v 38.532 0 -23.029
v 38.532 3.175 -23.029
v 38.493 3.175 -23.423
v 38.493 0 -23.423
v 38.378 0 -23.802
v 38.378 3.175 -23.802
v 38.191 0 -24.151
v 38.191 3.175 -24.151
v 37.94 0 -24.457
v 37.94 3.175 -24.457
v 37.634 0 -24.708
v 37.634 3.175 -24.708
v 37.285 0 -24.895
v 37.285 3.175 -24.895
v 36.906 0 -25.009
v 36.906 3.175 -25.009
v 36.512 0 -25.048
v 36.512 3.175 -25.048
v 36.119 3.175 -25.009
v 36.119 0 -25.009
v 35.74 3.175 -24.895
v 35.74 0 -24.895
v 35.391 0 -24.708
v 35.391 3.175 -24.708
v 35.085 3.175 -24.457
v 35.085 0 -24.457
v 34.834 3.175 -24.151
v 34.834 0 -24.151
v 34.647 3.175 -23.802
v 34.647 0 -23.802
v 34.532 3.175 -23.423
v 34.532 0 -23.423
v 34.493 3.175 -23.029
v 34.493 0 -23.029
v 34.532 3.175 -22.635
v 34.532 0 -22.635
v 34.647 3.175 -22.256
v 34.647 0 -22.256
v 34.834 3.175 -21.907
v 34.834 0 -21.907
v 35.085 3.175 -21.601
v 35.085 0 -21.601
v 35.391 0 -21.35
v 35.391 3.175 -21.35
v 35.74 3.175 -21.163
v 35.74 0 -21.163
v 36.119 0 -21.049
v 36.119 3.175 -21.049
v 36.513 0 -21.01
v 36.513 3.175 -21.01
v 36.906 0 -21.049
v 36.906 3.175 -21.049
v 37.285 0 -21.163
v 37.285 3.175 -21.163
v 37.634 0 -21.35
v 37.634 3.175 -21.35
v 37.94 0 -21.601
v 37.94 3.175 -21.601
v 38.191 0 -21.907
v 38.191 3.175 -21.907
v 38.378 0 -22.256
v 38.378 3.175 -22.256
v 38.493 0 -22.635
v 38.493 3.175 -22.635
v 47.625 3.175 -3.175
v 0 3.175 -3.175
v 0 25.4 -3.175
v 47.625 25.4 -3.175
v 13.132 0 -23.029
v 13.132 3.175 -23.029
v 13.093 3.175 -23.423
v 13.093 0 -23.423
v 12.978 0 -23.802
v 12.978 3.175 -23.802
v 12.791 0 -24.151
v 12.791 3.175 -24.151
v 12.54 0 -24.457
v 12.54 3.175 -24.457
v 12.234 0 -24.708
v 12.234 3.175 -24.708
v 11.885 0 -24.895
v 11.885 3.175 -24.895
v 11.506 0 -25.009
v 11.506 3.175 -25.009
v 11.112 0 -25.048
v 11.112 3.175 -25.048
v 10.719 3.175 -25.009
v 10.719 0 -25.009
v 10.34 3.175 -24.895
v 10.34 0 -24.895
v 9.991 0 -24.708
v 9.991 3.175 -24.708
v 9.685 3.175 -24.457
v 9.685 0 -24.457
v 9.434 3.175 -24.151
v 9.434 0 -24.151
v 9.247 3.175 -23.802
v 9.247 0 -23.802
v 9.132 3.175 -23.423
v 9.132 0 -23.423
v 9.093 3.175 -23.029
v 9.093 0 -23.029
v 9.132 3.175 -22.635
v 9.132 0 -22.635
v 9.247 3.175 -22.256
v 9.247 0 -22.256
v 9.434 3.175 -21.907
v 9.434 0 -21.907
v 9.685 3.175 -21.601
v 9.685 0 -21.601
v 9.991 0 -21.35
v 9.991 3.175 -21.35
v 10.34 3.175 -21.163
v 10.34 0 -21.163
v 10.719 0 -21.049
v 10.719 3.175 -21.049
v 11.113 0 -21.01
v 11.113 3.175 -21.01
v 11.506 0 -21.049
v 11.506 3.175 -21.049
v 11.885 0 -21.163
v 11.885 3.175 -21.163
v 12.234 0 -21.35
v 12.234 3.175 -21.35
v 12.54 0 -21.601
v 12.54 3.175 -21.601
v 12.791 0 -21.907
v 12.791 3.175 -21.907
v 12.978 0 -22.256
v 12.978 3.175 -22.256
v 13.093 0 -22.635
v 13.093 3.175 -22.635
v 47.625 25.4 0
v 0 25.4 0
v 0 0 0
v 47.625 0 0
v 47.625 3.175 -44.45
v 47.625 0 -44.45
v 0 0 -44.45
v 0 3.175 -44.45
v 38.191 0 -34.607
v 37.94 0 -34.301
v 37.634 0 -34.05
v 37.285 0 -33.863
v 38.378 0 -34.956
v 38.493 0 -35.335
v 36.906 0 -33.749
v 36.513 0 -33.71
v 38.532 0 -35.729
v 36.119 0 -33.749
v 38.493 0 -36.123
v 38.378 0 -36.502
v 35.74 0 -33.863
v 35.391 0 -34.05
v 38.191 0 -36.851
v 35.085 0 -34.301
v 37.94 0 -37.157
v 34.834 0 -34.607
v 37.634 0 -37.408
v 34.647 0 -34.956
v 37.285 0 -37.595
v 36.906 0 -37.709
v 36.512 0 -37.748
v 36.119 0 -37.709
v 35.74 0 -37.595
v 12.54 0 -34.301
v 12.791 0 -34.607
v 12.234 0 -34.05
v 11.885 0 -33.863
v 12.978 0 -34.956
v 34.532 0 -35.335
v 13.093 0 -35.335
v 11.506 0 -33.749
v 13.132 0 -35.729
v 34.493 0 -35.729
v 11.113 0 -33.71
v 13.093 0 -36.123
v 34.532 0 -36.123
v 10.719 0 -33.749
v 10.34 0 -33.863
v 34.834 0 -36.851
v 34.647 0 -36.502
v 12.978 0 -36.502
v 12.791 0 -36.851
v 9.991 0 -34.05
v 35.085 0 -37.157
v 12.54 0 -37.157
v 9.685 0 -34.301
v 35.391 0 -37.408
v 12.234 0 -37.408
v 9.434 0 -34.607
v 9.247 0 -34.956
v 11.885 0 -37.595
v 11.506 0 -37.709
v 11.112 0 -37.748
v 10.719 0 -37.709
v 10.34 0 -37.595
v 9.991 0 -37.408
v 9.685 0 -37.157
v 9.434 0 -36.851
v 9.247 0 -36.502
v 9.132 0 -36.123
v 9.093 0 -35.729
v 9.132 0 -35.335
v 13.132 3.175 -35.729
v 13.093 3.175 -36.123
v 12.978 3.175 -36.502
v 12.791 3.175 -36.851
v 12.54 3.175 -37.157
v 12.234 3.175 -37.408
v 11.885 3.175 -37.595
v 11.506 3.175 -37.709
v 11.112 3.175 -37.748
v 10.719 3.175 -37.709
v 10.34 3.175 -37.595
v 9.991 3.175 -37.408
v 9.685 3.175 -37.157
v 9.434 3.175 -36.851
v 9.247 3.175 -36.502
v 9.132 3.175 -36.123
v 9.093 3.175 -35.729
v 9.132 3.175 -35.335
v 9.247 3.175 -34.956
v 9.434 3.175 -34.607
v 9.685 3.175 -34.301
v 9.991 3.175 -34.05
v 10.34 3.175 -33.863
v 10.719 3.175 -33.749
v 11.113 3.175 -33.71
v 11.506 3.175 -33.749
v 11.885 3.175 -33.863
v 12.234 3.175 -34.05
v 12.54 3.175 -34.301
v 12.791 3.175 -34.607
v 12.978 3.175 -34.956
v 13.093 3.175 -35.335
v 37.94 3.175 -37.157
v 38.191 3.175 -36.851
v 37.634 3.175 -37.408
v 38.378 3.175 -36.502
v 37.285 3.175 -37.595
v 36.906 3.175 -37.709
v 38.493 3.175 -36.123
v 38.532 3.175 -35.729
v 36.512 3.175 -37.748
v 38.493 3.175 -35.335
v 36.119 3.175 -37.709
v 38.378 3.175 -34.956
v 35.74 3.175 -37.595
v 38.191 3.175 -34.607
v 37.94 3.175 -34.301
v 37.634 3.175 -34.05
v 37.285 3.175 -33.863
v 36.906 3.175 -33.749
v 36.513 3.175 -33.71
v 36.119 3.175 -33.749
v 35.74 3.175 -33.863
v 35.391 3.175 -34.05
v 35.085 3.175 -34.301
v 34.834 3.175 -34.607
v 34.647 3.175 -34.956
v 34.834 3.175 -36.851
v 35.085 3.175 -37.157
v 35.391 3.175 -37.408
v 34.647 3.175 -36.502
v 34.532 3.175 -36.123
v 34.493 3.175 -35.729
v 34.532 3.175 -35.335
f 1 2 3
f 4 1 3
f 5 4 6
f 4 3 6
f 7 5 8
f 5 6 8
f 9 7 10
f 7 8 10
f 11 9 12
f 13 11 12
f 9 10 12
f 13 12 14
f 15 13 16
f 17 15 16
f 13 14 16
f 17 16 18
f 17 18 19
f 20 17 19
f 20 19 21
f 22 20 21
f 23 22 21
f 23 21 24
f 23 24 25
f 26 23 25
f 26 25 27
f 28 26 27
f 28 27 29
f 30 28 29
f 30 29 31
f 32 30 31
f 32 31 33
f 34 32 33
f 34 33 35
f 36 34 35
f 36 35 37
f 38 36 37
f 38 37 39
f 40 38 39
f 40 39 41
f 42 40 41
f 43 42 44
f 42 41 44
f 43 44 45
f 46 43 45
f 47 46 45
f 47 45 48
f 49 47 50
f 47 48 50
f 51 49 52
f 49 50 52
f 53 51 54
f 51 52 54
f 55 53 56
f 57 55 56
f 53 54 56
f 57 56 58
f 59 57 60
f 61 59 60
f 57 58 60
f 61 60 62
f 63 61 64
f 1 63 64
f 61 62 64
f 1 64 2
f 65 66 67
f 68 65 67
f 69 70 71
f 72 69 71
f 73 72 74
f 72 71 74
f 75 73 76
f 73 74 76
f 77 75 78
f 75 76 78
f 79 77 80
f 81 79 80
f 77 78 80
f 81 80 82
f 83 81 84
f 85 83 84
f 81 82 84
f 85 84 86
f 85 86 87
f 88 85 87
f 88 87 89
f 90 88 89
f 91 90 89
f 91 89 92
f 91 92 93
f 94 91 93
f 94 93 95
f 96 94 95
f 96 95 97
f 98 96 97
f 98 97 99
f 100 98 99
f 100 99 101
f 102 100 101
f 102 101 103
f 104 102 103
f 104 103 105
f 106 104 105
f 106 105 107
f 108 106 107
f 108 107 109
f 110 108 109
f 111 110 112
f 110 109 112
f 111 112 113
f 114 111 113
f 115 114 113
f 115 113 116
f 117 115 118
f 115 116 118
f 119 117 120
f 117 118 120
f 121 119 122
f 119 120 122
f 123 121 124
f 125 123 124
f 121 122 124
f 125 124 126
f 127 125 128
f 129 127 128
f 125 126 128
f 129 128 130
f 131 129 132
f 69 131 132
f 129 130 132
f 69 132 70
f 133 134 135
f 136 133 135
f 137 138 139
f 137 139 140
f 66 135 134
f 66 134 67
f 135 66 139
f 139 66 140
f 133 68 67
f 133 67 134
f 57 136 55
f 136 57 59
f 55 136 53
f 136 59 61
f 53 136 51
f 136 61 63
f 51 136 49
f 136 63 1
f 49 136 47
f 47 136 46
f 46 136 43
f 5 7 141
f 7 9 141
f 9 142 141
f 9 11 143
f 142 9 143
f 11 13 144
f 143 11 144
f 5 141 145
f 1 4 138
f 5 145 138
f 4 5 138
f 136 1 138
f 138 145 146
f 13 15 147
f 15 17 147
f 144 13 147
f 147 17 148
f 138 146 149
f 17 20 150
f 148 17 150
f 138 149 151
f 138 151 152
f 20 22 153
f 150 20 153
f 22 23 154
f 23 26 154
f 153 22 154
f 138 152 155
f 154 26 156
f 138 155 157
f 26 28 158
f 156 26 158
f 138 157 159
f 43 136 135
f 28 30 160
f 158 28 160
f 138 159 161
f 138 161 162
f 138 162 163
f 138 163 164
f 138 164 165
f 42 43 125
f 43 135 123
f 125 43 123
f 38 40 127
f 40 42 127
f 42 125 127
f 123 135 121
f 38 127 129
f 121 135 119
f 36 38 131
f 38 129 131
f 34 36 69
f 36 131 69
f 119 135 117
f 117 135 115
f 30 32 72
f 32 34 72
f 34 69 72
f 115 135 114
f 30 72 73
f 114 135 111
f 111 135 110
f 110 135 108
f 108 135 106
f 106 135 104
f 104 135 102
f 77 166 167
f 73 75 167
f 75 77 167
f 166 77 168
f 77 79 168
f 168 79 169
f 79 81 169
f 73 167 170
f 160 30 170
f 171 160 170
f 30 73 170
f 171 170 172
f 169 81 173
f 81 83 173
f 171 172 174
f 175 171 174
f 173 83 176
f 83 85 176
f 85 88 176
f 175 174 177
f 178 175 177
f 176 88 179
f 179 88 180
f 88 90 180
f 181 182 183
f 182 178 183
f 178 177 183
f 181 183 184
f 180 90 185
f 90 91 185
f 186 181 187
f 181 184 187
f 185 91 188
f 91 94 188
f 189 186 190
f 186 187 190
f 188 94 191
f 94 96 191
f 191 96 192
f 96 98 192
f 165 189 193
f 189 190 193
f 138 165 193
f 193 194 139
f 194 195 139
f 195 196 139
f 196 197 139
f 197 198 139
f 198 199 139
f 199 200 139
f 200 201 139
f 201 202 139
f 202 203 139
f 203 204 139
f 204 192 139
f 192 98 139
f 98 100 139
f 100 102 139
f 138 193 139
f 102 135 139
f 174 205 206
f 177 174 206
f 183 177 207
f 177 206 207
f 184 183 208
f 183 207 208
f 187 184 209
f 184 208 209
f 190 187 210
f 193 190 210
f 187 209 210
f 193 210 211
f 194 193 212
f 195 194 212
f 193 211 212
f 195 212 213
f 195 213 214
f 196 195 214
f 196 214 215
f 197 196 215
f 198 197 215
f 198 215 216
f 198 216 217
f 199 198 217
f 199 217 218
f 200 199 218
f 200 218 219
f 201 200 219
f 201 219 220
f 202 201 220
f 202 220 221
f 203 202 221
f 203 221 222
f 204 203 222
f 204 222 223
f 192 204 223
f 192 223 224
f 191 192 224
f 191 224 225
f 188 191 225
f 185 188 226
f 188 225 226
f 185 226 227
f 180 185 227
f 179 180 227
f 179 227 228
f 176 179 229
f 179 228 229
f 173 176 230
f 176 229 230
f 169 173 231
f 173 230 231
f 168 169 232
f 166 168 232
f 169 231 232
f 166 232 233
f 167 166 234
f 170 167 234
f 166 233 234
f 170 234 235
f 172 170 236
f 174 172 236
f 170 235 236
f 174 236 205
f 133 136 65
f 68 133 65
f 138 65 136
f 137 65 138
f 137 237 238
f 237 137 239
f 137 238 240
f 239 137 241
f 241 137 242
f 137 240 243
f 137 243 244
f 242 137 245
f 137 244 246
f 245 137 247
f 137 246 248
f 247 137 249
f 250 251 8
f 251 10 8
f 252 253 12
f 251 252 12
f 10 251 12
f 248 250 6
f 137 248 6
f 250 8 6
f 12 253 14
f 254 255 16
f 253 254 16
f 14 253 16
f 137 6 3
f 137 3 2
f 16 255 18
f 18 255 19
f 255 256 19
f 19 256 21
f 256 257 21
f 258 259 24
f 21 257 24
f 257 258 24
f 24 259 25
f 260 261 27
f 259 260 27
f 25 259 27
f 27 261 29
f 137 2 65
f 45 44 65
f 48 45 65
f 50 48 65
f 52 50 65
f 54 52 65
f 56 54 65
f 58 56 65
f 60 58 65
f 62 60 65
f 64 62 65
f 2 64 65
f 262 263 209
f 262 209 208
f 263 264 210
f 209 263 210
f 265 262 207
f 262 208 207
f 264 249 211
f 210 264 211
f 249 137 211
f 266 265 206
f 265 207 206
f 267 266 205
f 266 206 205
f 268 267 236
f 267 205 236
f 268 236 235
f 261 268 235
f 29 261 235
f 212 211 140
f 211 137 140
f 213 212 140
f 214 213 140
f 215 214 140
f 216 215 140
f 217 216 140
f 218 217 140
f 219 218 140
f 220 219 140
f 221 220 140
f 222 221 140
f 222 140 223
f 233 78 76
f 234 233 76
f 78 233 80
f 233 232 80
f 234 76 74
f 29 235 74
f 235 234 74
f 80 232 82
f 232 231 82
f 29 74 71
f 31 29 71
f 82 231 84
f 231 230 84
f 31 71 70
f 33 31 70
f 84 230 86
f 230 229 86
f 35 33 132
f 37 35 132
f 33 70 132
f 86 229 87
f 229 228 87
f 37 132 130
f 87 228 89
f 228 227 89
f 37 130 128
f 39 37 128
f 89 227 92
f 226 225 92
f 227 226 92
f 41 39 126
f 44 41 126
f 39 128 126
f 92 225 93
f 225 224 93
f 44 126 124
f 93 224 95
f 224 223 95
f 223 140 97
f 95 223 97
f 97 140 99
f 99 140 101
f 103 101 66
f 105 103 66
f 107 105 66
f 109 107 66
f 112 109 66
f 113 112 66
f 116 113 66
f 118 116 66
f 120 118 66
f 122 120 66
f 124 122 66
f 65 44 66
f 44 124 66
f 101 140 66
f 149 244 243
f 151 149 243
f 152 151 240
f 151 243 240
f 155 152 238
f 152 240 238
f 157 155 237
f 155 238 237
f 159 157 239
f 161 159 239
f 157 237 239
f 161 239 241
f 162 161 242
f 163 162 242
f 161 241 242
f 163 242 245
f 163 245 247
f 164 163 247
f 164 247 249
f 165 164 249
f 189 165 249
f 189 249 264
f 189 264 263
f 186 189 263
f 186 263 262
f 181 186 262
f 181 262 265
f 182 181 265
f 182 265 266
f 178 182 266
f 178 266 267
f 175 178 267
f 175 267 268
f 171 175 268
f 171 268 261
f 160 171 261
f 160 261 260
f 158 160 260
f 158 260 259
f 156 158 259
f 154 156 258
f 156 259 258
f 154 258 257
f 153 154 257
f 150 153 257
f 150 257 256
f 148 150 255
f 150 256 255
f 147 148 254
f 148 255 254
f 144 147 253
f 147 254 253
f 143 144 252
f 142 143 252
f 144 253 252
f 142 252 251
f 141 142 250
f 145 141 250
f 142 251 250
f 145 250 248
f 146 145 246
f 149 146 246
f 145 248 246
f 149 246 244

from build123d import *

# Parameters (mm, degrees)
BOSS_EXTRUDE1_DEPTH = 47.625
CUT_EXTRUDE1_REACH  = 5.175
SKETCH2_R           = 2.0193


with BuildPart() as part:
    # Sketch1 → Boss-Extrude1 (new body)
    with BuildSketch(Plane(origin=(0, 0, 0), x_dir=(0, 0, -1), z_dir=(1, 0, 0))):
        Polygon((3.175, 3.175), (3.175, 25.4), (0, 25.4), (0, 0), (44.45, 0), (44.45, 3.175), align=None)
    extrude(amount=BOSS_EXTRUDE1_DEPTH)

    # Sketch2 → Cut-Extrude1 (cut, up to next)
    with BuildSketch(Plane(origin=(0, 3.175, 0), x_dir=(1, 0, 0), z_dir=(0, 1, 0)), mode=Mode.PRIVATE) as cut_extrude1_sk1:
        with Locations((11.1125, 23.029)):
            Circle(SKETCH2_R)
    cut_extrude1_tool1 = extrude(cut_extrude1_sk1.sketch, amount=-CUT_EXTRUDE1_REACH, mode=Mode.PRIVATE) & part.part
    add(cut_extrude1_tool1.solids().sort_by_distance((11.1125, 3.175, -23.029))[0], mode=Mode.SUBTRACT)
    # Sketch2 → Cut-Extrude1 (cut, up to next)
    with BuildSketch(Plane(origin=(0, 3.175, 0), x_dir=(1, 0, 0), z_dir=(0, 1, 0)), mode=Mode.PRIVATE) as cut_extrude1_sk2:
        with Locations((11.1125, 35.729)):
            Circle(SKETCH2_R)
    cut_extrude1_tool2 = extrude(cut_extrude1_sk2.sketch, amount=-CUT_EXTRUDE1_REACH, mode=Mode.PRIVATE) & part.part
    add(cut_extrude1_tool2.solids().sort_by_distance((11.1125, 3.175, -35.729))[0], mode=Mode.SUBTRACT)
    # Sketch2 → Cut-Extrude1 (cut, up to next)
    with BuildSketch(Plane(origin=(0, 3.175, 0), x_dir=(1, 0, 0), z_dir=(0, 1, 0)), mode=Mode.PRIVATE) as cut_extrude1_sk3:
        with Locations((36.5125, 23.029)):
            Circle(SKETCH2_R)
    cut_extrude1_tool3 = extrude(cut_extrude1_sk3.sketch, amount=-CUT_EXTRUDE1_REACH, mode=Mode.PRIVATE) & part.part
    add(cut_extrude1_tool3.solids().sort_by_distance((36.5125, 3.175, -23.029))[0], mode=Mode.SUBTRACT)
    # Sketch2 → Cut-Extrude1 (cut, up to next)
    with BuildSketch(Plane(origin=(0, 3.175, 0), x_dir=(1, 0, 0), z_dir=(0, 1, 0)), mode=Mode.PRIVATE) as cut_extrude1_sk4:
        with Locations((36.5125, 35.729)):
            Circle(SKETCH2_R)
    cut_extrude1_tool4 = extrude(cut_extrude1_sk4.sketch, amount=-CUT_EXTRUDE1_REACH, mode=Mode.PRIVATE) & part.part
    add(cut_extrude1_tool4.solids().sort_by_distance((36.5125, 3.175, -35.729))[0], mode=Mode.SUBTRACT)


solid = part.part
